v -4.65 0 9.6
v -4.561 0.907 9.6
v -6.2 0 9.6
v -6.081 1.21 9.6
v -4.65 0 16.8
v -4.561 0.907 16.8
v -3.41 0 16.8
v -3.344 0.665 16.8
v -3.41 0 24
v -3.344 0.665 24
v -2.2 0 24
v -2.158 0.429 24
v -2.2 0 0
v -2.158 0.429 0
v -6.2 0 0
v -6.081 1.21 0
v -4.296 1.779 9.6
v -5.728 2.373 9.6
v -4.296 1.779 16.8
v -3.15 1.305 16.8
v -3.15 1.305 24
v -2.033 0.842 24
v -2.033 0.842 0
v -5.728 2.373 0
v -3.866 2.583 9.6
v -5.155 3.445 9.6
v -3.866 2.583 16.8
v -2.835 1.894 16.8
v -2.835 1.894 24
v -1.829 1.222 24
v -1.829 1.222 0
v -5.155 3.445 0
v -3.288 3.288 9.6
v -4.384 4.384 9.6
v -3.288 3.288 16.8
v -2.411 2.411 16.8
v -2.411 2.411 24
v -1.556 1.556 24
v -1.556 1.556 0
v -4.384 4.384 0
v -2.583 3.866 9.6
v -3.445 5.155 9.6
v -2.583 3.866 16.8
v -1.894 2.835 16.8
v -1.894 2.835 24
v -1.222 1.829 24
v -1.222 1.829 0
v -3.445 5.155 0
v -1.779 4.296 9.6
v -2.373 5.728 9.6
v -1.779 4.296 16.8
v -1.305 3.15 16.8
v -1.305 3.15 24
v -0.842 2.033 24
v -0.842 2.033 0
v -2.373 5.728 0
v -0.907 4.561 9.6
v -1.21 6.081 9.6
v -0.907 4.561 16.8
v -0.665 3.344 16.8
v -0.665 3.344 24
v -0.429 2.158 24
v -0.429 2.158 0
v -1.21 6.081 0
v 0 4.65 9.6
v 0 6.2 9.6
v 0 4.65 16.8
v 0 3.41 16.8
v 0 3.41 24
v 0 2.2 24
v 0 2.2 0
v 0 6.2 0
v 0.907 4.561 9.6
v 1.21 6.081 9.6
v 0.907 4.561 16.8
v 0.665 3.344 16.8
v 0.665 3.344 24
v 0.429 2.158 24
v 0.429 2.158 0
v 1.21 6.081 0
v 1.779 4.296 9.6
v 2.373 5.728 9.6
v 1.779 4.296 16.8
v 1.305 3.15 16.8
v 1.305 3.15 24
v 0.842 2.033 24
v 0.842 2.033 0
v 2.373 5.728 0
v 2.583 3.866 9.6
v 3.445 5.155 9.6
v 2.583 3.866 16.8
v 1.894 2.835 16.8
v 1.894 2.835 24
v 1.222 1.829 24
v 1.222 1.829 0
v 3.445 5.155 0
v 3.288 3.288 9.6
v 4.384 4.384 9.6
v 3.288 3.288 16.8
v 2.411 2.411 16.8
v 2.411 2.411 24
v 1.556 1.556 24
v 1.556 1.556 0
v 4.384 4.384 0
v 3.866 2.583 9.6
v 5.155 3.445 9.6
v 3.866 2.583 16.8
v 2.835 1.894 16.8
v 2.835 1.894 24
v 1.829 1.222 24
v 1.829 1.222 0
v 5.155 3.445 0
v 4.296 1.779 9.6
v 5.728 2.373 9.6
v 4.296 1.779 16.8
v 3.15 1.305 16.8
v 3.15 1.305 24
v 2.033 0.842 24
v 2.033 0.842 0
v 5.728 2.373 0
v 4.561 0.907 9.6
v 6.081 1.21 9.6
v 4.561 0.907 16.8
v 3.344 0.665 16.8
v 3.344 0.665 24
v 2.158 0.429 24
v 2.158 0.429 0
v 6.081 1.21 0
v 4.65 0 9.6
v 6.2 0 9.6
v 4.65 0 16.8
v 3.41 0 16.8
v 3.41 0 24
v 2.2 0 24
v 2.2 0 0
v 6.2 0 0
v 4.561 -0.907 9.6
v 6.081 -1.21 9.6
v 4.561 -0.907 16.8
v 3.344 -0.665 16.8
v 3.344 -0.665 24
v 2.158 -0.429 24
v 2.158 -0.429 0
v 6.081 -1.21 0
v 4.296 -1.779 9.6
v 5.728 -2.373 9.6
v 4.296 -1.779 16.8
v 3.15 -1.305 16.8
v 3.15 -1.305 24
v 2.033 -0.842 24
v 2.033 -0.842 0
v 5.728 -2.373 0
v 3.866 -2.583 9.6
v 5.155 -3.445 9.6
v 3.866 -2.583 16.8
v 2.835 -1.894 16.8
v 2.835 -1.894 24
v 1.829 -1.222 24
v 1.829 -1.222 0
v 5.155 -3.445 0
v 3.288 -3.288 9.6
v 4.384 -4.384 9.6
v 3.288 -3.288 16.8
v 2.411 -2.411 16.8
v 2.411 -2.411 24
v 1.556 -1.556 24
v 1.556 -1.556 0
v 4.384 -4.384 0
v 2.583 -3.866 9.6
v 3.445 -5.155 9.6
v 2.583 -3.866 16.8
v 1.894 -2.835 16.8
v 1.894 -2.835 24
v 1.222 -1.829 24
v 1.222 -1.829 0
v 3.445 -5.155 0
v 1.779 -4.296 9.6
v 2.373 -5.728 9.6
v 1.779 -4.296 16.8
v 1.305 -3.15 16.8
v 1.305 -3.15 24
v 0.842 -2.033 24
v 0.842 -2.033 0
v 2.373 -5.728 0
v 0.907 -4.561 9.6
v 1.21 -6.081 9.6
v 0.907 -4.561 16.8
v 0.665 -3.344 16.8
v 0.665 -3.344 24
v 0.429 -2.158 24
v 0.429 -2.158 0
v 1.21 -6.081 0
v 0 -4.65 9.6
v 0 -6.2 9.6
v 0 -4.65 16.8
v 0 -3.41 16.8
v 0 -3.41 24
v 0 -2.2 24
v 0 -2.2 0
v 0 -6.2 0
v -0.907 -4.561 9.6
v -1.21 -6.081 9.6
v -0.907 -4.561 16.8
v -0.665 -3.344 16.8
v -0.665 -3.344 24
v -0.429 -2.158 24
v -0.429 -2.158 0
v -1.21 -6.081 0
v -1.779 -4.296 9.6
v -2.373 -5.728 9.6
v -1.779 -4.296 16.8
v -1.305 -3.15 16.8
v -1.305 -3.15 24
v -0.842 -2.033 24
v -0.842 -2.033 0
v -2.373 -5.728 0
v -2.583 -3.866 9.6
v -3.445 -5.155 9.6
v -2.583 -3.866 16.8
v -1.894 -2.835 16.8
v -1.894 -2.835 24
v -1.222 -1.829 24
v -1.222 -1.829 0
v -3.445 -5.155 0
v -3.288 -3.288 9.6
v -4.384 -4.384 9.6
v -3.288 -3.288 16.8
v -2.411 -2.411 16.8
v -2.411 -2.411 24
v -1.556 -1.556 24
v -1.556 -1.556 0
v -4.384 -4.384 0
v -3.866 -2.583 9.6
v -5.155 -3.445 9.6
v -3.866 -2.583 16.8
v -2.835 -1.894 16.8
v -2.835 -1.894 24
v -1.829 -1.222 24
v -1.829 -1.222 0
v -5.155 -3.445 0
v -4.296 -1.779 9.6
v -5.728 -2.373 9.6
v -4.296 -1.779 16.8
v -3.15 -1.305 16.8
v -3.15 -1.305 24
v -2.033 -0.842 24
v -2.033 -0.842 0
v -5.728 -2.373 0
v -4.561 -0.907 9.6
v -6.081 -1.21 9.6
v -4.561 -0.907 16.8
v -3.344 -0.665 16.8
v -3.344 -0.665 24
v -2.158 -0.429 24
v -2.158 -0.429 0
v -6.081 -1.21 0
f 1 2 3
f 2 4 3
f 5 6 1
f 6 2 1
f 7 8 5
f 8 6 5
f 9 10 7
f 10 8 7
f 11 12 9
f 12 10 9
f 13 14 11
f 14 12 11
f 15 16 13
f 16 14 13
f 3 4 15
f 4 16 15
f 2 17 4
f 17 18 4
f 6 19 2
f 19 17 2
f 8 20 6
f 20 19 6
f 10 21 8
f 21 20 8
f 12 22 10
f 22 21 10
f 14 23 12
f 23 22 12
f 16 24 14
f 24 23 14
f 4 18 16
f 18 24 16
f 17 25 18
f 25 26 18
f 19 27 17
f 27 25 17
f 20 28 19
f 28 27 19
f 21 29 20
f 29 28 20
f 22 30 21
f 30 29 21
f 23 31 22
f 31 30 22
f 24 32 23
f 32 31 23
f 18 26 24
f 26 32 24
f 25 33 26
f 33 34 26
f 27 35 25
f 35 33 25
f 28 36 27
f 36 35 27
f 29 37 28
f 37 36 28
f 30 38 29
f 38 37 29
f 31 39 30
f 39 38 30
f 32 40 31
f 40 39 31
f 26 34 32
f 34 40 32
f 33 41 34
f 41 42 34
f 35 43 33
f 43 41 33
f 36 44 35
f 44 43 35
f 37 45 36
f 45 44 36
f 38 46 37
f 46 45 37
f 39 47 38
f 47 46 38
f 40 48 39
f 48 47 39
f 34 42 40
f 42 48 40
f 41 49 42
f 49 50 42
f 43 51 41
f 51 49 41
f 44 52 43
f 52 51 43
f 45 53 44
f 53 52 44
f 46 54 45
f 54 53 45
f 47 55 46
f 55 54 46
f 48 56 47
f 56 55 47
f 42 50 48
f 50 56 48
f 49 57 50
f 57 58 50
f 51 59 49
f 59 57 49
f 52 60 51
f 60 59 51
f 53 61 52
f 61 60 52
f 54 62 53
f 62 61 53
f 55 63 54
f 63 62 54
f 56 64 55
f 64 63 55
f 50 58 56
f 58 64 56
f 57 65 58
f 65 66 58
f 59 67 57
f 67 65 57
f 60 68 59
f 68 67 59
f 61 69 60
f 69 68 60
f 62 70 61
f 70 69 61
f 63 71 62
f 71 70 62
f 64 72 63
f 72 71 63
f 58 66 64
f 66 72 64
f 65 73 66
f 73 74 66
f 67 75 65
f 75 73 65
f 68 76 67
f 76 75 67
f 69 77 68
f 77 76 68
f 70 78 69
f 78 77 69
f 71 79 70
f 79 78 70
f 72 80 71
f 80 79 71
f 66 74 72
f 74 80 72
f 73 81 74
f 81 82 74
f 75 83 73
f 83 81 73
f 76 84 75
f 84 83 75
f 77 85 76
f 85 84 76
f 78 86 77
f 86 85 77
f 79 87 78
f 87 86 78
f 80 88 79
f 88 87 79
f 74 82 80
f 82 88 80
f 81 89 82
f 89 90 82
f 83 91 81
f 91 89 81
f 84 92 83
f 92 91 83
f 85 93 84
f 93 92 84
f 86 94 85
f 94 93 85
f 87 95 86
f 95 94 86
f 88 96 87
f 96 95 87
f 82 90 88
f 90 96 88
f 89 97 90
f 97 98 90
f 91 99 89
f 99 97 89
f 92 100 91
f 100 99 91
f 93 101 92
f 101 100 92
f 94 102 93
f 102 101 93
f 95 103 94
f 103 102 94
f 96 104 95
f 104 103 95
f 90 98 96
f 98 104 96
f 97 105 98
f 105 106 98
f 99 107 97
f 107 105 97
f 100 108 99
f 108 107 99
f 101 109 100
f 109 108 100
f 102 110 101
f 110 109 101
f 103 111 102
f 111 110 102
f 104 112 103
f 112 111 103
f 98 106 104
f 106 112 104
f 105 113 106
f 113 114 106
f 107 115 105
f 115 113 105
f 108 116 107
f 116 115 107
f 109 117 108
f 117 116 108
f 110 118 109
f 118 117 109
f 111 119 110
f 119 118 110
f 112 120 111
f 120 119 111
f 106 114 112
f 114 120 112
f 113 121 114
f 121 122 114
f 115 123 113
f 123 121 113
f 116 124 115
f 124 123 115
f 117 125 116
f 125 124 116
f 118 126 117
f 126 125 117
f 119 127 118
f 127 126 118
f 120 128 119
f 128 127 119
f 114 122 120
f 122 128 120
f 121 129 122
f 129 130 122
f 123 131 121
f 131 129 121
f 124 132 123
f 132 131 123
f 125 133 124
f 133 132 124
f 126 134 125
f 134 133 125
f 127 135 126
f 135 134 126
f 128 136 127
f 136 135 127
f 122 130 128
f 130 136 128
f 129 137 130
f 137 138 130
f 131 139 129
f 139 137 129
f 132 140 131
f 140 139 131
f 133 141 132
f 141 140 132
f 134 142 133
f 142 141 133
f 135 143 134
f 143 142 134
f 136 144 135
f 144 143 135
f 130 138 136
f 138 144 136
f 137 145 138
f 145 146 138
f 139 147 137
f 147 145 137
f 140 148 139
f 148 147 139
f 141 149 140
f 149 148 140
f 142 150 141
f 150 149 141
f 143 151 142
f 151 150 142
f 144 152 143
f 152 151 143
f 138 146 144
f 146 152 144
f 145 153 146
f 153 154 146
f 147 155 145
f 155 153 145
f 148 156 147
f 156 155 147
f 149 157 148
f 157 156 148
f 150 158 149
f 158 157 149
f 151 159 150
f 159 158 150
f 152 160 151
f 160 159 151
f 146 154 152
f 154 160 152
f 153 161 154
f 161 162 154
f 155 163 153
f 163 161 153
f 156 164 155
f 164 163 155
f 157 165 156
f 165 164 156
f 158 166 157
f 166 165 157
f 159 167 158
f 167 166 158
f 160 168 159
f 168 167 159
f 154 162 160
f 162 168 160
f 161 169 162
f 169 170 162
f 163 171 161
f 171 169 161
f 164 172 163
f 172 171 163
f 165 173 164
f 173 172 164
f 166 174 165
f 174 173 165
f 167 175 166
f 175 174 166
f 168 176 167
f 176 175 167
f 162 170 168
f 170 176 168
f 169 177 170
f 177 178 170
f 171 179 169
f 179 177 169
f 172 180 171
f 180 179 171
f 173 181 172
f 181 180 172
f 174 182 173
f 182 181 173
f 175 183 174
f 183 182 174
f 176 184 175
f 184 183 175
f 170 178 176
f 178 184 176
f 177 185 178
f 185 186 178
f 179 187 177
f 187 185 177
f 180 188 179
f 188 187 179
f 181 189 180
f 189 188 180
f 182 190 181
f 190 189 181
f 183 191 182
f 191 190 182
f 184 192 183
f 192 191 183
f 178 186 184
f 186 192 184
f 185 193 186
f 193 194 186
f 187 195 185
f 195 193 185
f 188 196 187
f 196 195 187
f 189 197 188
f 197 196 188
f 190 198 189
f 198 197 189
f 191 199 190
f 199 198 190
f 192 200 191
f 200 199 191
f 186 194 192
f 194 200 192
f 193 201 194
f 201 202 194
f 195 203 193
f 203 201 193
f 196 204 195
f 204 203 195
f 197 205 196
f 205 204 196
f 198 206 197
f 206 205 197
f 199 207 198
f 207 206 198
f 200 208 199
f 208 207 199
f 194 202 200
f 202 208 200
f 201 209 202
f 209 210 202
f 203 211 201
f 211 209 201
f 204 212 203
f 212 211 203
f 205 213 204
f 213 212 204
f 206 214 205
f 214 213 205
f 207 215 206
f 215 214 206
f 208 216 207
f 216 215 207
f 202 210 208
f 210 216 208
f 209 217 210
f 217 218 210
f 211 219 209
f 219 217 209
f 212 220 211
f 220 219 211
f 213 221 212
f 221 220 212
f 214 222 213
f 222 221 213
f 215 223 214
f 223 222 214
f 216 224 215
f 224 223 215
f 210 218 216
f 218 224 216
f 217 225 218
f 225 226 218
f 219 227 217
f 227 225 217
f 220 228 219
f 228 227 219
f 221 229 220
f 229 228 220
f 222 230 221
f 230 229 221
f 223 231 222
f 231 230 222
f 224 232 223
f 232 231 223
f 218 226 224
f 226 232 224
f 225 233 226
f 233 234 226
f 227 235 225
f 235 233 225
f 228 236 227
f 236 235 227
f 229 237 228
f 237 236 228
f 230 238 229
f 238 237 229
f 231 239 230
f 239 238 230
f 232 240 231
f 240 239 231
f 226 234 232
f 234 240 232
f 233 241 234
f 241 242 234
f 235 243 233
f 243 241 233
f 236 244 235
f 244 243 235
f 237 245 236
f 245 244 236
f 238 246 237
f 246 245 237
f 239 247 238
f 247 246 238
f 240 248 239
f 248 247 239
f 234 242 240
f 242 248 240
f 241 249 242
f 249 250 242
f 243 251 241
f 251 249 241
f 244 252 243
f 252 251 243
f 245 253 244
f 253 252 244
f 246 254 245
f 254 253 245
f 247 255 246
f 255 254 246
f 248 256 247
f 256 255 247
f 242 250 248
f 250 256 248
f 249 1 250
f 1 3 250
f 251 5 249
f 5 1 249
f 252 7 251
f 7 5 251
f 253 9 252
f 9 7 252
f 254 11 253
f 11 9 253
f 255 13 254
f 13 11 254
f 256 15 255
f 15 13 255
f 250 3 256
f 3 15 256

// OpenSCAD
$fn = 32;

// ----------------------------------------------------------------------
// Profiled standoff: stepped spacer, 24 mm long, bore 4.4 mm
// ----------------------------------------------------------------------

// --- parameters (mm) ---
revolve_angle = 360;      // full turn around the Z axis
profile_points = 8;       // points of the closed outline

profile = [[2.2, 0], [6.2, 0], [6.2, 9.6], [4.65, 9.6], [4.65, 16.8], [3.41, 16.8], [3.41, 24], [2.2, 24]];  // single closed polygon, 8 points, counter clockwise

// --- the one profile operation ---
rotate_extrude(angle = revolve_angle) polygon(points = profile);
